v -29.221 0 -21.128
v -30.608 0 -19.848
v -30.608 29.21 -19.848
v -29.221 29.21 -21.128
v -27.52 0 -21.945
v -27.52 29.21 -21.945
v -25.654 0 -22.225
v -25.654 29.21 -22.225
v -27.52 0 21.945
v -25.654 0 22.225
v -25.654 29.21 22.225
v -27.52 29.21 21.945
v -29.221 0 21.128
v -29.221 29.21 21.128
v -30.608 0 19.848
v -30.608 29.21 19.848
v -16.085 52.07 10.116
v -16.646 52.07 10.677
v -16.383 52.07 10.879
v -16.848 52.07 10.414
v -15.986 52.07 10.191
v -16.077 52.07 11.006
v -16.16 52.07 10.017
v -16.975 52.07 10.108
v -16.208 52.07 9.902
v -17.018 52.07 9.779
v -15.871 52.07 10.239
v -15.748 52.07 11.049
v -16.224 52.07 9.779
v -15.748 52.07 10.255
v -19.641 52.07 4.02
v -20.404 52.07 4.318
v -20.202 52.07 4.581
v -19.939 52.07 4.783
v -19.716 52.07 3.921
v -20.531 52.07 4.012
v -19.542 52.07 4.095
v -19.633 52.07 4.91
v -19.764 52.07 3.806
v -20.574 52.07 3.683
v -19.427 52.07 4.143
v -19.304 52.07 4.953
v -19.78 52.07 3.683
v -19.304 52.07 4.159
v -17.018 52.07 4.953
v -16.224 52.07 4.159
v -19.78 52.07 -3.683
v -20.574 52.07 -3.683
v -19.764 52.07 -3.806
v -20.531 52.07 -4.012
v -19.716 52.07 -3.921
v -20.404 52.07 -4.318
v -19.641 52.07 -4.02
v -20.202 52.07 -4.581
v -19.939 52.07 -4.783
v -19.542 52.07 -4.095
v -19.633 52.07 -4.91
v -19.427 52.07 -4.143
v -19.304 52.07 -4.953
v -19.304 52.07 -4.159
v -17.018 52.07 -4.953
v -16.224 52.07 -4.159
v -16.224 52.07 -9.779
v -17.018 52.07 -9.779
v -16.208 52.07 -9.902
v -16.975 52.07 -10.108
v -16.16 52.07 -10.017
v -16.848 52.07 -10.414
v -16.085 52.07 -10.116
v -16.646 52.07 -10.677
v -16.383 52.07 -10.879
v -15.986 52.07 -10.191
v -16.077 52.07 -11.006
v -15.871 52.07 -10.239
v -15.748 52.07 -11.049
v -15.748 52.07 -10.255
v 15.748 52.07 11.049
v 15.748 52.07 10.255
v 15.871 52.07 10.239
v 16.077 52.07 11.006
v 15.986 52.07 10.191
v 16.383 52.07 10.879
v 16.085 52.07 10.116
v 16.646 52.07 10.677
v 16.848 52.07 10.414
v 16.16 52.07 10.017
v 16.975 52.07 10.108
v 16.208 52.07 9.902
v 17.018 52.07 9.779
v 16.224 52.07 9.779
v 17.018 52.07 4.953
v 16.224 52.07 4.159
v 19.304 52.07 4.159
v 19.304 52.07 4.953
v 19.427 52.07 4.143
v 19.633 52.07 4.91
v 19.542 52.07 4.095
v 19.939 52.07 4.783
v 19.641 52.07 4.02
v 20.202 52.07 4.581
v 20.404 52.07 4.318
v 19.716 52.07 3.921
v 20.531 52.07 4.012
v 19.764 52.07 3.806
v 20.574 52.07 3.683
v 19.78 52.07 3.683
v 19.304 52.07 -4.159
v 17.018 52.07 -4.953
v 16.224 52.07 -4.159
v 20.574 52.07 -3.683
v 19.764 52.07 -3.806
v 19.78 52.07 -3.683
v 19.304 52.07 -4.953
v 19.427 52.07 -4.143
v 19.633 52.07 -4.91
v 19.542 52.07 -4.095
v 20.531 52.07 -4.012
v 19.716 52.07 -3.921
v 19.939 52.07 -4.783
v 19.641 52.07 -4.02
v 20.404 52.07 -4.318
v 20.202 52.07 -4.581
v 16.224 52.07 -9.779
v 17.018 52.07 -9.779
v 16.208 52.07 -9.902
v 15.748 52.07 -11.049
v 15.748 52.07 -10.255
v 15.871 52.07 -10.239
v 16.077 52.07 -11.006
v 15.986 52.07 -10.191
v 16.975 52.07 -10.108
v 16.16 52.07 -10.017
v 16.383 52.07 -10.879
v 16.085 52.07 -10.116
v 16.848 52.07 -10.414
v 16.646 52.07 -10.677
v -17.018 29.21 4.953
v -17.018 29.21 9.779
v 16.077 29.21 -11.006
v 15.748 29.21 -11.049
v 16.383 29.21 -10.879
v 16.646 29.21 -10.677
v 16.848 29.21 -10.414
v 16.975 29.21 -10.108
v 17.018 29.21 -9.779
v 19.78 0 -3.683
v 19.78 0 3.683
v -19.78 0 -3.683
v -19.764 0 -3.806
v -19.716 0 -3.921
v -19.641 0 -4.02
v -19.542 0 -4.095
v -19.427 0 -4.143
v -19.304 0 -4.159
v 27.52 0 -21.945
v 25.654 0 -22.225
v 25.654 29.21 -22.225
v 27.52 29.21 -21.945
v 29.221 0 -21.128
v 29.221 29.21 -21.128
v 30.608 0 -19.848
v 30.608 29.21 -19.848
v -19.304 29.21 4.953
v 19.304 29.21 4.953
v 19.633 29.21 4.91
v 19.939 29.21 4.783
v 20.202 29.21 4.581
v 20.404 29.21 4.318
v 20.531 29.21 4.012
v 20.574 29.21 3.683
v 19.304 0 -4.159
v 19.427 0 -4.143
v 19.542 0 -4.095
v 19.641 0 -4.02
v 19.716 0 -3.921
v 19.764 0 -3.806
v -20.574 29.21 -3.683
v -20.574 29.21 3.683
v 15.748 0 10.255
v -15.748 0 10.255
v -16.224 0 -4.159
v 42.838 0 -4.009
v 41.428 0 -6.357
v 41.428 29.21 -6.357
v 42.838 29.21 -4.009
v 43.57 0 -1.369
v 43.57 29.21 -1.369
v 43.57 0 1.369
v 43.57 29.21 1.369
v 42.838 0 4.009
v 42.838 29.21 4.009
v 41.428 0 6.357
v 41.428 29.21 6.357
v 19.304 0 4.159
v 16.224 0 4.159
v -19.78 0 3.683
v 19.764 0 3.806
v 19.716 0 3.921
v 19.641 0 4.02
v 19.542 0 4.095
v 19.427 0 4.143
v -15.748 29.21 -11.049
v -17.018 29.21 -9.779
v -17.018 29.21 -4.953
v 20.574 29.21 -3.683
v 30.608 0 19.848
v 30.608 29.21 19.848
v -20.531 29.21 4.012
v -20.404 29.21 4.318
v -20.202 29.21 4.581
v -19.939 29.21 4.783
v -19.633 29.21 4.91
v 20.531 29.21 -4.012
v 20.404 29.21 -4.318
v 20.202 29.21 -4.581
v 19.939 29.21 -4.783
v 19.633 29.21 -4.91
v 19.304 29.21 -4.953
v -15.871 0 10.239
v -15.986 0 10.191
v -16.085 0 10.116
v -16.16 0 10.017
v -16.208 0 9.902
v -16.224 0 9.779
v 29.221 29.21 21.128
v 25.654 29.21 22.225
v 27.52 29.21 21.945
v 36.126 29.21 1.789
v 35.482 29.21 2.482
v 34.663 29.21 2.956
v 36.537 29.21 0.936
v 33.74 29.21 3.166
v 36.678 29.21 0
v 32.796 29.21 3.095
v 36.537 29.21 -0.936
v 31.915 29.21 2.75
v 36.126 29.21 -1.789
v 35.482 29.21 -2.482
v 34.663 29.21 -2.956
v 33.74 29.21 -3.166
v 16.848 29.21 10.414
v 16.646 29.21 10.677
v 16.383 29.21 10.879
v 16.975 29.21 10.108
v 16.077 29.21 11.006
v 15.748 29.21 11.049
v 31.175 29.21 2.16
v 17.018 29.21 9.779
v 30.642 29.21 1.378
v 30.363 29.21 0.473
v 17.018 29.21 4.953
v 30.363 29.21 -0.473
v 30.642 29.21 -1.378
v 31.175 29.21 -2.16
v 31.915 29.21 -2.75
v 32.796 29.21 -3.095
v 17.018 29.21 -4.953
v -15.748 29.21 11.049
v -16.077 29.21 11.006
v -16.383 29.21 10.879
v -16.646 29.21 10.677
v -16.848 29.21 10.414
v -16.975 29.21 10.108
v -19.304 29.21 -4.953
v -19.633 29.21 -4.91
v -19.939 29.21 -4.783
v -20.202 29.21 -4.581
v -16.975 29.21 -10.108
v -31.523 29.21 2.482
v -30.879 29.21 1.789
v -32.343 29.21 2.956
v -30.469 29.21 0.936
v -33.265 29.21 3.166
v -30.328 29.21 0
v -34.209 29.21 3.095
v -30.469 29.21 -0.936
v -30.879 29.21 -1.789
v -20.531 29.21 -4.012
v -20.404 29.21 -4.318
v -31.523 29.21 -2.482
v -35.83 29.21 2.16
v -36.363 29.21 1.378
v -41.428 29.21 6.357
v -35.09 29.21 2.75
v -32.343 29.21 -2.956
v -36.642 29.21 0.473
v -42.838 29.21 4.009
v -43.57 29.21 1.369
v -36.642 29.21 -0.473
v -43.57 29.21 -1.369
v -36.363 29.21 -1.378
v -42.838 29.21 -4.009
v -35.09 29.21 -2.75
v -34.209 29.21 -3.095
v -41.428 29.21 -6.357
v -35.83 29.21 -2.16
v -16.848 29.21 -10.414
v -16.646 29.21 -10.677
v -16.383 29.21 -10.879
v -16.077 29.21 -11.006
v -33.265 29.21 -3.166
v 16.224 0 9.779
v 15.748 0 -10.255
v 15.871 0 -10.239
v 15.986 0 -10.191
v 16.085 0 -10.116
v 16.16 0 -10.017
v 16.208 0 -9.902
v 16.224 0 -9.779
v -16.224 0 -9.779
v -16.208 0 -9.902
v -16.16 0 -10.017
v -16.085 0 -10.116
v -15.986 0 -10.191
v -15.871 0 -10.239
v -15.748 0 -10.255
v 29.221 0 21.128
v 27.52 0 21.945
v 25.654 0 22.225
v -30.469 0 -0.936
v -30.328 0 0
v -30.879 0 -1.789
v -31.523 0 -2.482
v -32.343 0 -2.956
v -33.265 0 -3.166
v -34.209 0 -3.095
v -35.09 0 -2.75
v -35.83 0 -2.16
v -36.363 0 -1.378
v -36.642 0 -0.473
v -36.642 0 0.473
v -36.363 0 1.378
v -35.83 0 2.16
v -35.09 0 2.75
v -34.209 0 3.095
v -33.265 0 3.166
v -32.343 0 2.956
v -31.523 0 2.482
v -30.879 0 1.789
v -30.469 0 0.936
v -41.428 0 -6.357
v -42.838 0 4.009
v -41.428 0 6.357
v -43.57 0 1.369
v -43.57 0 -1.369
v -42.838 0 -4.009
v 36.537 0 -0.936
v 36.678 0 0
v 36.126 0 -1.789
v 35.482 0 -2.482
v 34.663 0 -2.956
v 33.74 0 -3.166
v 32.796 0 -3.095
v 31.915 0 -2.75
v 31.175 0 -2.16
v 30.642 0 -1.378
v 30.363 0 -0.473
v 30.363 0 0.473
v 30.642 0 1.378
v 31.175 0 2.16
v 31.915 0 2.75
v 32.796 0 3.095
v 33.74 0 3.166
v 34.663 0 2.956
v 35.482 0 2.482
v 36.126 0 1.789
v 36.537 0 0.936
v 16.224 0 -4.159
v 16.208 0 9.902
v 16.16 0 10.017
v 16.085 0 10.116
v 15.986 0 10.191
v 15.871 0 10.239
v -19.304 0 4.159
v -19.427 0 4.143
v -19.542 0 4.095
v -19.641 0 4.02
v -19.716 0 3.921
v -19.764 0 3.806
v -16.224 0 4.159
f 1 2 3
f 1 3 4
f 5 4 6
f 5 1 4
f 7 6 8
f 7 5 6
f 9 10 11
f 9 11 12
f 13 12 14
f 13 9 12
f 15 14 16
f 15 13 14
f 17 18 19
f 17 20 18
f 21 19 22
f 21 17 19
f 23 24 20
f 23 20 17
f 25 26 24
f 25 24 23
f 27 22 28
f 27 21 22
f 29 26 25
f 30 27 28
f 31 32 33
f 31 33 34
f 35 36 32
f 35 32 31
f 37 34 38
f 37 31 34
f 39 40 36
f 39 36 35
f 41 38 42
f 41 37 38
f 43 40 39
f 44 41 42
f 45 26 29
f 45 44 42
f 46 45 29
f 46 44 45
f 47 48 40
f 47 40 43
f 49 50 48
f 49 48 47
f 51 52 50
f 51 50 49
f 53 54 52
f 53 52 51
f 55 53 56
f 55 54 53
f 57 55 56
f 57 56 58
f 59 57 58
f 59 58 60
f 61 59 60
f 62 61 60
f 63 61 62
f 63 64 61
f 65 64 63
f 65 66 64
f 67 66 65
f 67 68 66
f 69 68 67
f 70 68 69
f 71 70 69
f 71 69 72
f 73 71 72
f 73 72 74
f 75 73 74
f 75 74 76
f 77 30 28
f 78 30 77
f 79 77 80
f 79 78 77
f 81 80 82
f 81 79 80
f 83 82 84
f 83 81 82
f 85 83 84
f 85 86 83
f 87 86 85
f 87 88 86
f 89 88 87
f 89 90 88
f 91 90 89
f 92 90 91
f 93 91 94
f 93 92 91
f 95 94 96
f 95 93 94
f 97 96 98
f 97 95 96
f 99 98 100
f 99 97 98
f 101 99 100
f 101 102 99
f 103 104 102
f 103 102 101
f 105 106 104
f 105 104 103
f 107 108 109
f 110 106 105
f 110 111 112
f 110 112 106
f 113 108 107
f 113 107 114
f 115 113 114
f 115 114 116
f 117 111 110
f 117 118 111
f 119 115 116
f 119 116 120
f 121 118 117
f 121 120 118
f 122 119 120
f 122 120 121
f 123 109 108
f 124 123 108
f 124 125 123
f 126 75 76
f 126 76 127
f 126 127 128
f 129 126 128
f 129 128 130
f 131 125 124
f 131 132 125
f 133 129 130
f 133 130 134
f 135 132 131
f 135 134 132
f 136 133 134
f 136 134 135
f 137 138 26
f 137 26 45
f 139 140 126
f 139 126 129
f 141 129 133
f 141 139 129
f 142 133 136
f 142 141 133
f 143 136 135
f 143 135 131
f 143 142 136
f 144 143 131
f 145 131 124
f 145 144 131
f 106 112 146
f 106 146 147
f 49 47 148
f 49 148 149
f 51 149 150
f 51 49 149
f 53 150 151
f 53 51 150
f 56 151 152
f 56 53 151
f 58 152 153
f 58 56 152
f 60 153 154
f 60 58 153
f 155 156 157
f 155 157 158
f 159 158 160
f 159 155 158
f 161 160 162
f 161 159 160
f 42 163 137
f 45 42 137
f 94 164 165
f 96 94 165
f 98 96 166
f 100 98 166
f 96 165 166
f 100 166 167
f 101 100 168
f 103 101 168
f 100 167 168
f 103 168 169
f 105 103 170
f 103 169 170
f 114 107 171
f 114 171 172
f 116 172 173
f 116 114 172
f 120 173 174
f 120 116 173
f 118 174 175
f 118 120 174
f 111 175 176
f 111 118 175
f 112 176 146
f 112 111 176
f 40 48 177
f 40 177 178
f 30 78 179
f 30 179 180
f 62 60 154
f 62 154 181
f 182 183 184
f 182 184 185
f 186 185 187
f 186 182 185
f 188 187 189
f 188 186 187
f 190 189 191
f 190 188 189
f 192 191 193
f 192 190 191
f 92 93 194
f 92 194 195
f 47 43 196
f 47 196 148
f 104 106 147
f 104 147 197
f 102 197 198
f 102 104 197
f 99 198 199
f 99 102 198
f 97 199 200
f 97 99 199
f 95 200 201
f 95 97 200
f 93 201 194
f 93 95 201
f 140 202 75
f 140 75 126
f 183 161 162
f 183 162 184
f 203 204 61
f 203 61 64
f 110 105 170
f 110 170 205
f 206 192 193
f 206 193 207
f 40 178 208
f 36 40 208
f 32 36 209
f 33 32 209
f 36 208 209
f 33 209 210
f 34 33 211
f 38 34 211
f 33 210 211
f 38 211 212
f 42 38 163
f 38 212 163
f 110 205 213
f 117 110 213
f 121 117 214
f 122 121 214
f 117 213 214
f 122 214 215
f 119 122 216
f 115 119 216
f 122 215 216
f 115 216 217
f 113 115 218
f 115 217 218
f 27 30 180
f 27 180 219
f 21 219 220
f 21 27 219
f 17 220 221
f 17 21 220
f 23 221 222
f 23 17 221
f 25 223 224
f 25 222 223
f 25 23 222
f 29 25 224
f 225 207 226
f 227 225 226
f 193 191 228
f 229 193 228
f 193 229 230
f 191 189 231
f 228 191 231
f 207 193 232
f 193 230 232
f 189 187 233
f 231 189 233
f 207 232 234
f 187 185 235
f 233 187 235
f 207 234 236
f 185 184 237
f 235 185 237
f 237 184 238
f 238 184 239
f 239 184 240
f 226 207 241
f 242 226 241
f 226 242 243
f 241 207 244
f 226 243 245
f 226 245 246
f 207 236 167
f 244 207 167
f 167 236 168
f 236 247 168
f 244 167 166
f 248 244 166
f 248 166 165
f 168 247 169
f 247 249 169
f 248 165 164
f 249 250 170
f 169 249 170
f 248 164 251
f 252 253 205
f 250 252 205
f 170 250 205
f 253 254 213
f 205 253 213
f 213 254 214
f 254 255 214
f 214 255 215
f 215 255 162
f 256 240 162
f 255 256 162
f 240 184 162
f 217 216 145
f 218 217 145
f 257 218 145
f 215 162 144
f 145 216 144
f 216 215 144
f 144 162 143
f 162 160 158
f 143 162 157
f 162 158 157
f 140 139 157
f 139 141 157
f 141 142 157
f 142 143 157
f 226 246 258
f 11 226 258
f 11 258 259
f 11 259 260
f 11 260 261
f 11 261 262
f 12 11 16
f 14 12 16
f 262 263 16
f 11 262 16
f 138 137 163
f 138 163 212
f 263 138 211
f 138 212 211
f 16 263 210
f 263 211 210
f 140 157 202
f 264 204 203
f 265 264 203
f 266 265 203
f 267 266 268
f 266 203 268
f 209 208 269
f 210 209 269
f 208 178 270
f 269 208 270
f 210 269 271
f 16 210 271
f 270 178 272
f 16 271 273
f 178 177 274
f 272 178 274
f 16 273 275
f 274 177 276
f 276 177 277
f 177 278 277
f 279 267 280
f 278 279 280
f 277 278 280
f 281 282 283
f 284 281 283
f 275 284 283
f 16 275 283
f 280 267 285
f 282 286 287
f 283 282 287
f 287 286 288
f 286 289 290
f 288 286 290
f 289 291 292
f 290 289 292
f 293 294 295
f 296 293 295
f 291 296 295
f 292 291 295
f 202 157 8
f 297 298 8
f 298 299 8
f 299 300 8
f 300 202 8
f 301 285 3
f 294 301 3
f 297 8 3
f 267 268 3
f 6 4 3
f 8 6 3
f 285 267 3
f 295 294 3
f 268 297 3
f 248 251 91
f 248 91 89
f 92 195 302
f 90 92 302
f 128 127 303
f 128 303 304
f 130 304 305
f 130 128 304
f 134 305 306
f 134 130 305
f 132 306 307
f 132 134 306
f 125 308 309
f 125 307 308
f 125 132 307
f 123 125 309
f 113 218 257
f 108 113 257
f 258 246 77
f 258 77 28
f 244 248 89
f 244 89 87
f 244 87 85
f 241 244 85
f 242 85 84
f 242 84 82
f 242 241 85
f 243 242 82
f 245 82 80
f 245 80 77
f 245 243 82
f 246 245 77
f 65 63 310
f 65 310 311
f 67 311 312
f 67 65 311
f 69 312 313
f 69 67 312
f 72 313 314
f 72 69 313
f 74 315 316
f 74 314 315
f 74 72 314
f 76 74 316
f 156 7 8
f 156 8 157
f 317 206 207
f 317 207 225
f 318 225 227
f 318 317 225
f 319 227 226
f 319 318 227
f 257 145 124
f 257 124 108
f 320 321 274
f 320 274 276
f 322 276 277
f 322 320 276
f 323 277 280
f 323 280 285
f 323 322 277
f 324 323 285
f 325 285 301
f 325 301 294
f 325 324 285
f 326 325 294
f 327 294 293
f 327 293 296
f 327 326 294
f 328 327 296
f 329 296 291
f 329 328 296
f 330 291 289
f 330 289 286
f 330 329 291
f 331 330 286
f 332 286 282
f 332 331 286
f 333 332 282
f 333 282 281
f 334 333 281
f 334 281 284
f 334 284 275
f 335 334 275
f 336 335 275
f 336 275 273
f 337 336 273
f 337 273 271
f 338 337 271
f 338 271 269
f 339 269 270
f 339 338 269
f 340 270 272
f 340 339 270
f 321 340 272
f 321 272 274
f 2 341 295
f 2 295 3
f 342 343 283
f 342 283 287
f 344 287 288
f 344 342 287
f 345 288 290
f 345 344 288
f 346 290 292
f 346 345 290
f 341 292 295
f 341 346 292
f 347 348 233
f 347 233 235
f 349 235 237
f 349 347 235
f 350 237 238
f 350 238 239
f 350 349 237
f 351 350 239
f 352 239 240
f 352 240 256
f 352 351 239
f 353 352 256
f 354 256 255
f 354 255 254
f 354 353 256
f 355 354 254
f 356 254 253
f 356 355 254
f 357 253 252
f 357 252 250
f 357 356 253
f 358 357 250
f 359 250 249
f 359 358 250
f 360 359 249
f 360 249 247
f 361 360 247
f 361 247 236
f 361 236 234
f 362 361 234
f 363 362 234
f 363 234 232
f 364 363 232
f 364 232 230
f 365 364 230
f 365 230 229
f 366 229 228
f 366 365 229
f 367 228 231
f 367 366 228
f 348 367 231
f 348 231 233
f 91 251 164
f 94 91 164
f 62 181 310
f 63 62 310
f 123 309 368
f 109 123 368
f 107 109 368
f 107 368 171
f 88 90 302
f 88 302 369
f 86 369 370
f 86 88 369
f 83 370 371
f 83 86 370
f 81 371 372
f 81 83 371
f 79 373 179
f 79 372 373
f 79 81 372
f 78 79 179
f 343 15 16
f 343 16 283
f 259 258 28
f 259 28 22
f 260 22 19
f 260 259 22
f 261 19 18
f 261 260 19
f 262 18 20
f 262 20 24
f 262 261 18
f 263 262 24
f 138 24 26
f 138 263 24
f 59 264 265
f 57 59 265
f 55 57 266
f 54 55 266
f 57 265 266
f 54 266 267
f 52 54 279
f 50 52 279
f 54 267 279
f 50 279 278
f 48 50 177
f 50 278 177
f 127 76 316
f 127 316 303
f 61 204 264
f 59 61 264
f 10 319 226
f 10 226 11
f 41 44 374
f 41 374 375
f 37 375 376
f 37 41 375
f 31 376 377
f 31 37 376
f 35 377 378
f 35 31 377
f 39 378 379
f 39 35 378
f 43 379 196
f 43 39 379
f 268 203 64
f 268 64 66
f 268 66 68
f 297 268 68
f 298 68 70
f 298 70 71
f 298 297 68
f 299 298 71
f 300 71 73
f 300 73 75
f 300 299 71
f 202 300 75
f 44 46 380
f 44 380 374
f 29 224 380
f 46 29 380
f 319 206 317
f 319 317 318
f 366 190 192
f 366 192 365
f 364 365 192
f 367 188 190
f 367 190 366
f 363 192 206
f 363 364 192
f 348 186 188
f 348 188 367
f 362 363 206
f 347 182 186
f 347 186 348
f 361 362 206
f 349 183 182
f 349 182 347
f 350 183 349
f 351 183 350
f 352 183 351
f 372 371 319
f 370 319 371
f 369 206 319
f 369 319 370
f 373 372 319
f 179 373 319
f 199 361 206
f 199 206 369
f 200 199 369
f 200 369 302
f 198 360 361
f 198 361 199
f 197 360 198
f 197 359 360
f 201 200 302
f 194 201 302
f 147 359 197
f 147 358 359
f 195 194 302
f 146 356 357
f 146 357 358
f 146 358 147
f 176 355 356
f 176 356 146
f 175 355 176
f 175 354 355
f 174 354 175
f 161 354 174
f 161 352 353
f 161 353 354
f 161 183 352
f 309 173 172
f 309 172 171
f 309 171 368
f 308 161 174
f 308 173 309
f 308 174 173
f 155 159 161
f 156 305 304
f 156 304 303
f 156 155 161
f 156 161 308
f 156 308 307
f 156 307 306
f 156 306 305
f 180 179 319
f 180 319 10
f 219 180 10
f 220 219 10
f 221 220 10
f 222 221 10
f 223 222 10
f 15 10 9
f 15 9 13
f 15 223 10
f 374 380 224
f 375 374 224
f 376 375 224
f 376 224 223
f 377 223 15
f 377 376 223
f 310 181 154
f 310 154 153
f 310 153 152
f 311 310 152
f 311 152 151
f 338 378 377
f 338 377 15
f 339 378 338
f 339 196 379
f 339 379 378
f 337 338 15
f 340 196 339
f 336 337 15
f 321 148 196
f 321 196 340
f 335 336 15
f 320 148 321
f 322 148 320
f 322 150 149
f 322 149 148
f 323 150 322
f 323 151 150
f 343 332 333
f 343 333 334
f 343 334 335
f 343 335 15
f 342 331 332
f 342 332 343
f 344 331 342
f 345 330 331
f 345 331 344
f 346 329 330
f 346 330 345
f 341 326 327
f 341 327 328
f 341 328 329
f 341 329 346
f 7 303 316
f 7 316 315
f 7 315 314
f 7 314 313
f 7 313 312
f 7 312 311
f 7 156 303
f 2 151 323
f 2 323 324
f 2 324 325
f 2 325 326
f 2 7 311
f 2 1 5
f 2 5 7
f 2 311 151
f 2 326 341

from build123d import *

# Parameters (mm, degrees)
SKETCH1_R           = 3.175
BOSS_EXTRUDE1_DEPTH = 29.21
BOSS_EXTRUDE2_DEPTH = 22.86
CUT_EXTRUDE1_REACH  = 54.07


with BuildPart() as part:
    # Sketch1 → Boss-Extrude1 (new body)
    with BuildSketch(Plane(origin=(0, 0, 0), x_dir=(1, 0, 0), z_dir=(0, 1, 0))):
        with BuildLine():
            Line((30.607538026, 19.8480292), (41.428260842, 6.35684672))
            ThreePointArc((41.428260842, 6.35684672), (43.6626, 0), (41.428260842, -6.35684672))
            Line((41.428260842, -6.35684672), (30.607538026, -19.8480292))
            ThreePointArc((30.607538026, -19.8480292), (28.401158949, -21.599999363), (25.654, -22.225))
            Line((25.654, -22.225), (-25.654, -22.225))
            ThreePointArc((-25.654, -22.225), (-28.401158949, -21.599999363), (-30.607538026, -19.8480292))
            Line((-30.607538026, -19.8480292), (-41.428260842, -6.35684672))
            ThreePointArc((-41.428260842, -6.35684672), (-43.6626, 0), (-41.428260842, 6.35684672))
            Line((-41.428260842, 6.35684672), (-30.607538026, 19.8480292))
            ThreePointArc((-30.607538026, 19.8480292), (-28.401158949, 21.599999363), (-25.654, 22.225))
            Line((-25.654, 22.225), (25.654, 22.225))
            ThreePointArc((25.654, 22.225), (28.401158949, 21.599999363), (30.607538026, 19.8480292))
        make_face()
        with Locations((-33.5026, 0)):
            Circle(SKETCH1_R, mode=Mode.SUBTRACT)
        with Locations((33.5026, 0)):
            Circle(SKETCH1_R, mode=Mode.SUBTRACT)
    extrude(amount=BOSS_EXTRUDE1_DEPTH)

    # Sketch2 → Boss-Extrude2 (add)
    with BuildSketch(Plane(origin=(0, 29.21, 0), x_dir=(1, 0, 0), z_dir=(0, 1, 0))):
        with BuildLine():
            Line((-19.304, -4.953), (-17.018, -4.953))
            Line((-17.018, -4.953), (-17.018, 4.953))
            Line((-17.018, 4.953), (-19.304, 4.953))
            ThreePointArc((-19.304, 4.953), (-20.202025612, 4.581025612), (-20.574, 3.683))
            Line((-20.574, 3.683), (-20.574, -3.683))
            ThreePointArc((-20.574, -3.683), (-20.202025612, -4.581025612), (-19.304, -4.953))
        make_face()
        with BuildLine():
            ThreePointArc((-17.018, 9.779), (-16.646025612, 10.677025612), (-15.748, 11.049))
            Line((-15.748, 11.049), (15.748, 11.049))
            ThreePointArc((15.748, 11.049), (16.646025612, 10.677025612), (17.018, 9.779))
            Line((17.018, 9.779), (17.018, -9.779))
            ThreePointArc((17.018, -9.779), (16.646025612, -10.677025612), (15.748, -11.049))
            Line((15.748, -11.049), (-15.748, -11.049))
            ThreePointArc((-15.748, -11.049), (-16.646025612, -10.677025612), (-17.018, -9.779))
            Line((-17.018, -9.779), (-17.018, 9.779))
        make_face()
        with BuildLine():
            Line((17.018, 4.953), (17.018, -4.953))
            Line((17.018, -4.953), (19.304, -4.953))
            ThreePointArc((19.304, -4.953), (20.202025612, -4.581025612), (20.574, -3.683))
            Line((20.574, -3.683), (20.574, 3.683))
            ThreePointArc((20.574, 3.683), (20.202025612, 4.581025612), (19.304, 4.953))
            Line((19.304, 4.953), (17.018, 4.953))
        make_face()
    extrude(amount=BOSS_EXTRUDE2_DEPTH)

    # Sketch4 → Cut-Extrude1 (cut, up to next)
    with BuildSketch(Plane(origin=(0, 52.07, 0), x_dir=(1, 0, 0), z_dir=(0, 1, 0)), mode=Mode.PRIVATE) as cut_extrude1_sk1:
        with BuildLine():
            Line((-16.22425, 4.15925), (-16.22425, 9.779))
            ThreePointArc((-16.22425, 9.779), (-16.084759605, 10.115759605), (-15.748, 10.25525))
            Line((-15.748, 10.25525), (15.748, 10.25525))
            ThreePointArc((15.748, 10.25525), (16.084759605, 10.115759605), (16.22425, 9.779))
            Line((16.22425, 9.779), (16.22425, 4.15925))
            Line((16.22425, 4.15925), (19.304, 4.15925))
            ThreePointArc((19.304, 4.15925), (19.640759605, 4.019759605), (19.78025, 3.683))
            Line((19.78025, 3.683), (19.78025, -3.683))
            ThreePointArc((19.78025, -3.683), (19.640759605, -4.019759605), (19.304, -4.15925))
            Line((19.304, -4.15925), (16.22425, -4.15925))
            Line((16.22425, -4.15925), (16.22425, -9.779))
            ThreePointArc((16.22425, -9.779), (16.084759605, -10.115759605), (15.748, -10.25525))
            Line((15.748, -10.25525), (-15.748, -10.25525))
            ThreePointArc((-15.748, -10.25525), (-16.084759605, -10.115759605), (-16.22425, -9.779))
            Line((-16.22425, -9.779), (-16.22425, -4.15925))
            Line((-16.22425, -4.15925), (-19.304, -4.15925))
            ThreePointArc((-19.304, -4.15925), (-19.640759605, -4.019759605), (-19.78025, -3.683))
            Line((-19.78025, -3.683), (-19.78025, 3.683))
            ThreePointArc((-19.78025, 3.683), (-19.640759605, 4.019759605), (-19.304, 4.15925))
            Line((-19.304, 4.15925), (-16.22425, 4.15925))
        make_face()
    cut_extrude1_tool1 = extrude(cut_extrude1_sk1.sketch, amount=-CUT_EXTRUDE1_REACH, mode=Mode.PRIVATE) & part.part
    add(cut_extrude1_tool1.solids().sort_by_distance((0, 52.07, 0))[0], mode=Mode.SUBTRACT)


solid = part.part
